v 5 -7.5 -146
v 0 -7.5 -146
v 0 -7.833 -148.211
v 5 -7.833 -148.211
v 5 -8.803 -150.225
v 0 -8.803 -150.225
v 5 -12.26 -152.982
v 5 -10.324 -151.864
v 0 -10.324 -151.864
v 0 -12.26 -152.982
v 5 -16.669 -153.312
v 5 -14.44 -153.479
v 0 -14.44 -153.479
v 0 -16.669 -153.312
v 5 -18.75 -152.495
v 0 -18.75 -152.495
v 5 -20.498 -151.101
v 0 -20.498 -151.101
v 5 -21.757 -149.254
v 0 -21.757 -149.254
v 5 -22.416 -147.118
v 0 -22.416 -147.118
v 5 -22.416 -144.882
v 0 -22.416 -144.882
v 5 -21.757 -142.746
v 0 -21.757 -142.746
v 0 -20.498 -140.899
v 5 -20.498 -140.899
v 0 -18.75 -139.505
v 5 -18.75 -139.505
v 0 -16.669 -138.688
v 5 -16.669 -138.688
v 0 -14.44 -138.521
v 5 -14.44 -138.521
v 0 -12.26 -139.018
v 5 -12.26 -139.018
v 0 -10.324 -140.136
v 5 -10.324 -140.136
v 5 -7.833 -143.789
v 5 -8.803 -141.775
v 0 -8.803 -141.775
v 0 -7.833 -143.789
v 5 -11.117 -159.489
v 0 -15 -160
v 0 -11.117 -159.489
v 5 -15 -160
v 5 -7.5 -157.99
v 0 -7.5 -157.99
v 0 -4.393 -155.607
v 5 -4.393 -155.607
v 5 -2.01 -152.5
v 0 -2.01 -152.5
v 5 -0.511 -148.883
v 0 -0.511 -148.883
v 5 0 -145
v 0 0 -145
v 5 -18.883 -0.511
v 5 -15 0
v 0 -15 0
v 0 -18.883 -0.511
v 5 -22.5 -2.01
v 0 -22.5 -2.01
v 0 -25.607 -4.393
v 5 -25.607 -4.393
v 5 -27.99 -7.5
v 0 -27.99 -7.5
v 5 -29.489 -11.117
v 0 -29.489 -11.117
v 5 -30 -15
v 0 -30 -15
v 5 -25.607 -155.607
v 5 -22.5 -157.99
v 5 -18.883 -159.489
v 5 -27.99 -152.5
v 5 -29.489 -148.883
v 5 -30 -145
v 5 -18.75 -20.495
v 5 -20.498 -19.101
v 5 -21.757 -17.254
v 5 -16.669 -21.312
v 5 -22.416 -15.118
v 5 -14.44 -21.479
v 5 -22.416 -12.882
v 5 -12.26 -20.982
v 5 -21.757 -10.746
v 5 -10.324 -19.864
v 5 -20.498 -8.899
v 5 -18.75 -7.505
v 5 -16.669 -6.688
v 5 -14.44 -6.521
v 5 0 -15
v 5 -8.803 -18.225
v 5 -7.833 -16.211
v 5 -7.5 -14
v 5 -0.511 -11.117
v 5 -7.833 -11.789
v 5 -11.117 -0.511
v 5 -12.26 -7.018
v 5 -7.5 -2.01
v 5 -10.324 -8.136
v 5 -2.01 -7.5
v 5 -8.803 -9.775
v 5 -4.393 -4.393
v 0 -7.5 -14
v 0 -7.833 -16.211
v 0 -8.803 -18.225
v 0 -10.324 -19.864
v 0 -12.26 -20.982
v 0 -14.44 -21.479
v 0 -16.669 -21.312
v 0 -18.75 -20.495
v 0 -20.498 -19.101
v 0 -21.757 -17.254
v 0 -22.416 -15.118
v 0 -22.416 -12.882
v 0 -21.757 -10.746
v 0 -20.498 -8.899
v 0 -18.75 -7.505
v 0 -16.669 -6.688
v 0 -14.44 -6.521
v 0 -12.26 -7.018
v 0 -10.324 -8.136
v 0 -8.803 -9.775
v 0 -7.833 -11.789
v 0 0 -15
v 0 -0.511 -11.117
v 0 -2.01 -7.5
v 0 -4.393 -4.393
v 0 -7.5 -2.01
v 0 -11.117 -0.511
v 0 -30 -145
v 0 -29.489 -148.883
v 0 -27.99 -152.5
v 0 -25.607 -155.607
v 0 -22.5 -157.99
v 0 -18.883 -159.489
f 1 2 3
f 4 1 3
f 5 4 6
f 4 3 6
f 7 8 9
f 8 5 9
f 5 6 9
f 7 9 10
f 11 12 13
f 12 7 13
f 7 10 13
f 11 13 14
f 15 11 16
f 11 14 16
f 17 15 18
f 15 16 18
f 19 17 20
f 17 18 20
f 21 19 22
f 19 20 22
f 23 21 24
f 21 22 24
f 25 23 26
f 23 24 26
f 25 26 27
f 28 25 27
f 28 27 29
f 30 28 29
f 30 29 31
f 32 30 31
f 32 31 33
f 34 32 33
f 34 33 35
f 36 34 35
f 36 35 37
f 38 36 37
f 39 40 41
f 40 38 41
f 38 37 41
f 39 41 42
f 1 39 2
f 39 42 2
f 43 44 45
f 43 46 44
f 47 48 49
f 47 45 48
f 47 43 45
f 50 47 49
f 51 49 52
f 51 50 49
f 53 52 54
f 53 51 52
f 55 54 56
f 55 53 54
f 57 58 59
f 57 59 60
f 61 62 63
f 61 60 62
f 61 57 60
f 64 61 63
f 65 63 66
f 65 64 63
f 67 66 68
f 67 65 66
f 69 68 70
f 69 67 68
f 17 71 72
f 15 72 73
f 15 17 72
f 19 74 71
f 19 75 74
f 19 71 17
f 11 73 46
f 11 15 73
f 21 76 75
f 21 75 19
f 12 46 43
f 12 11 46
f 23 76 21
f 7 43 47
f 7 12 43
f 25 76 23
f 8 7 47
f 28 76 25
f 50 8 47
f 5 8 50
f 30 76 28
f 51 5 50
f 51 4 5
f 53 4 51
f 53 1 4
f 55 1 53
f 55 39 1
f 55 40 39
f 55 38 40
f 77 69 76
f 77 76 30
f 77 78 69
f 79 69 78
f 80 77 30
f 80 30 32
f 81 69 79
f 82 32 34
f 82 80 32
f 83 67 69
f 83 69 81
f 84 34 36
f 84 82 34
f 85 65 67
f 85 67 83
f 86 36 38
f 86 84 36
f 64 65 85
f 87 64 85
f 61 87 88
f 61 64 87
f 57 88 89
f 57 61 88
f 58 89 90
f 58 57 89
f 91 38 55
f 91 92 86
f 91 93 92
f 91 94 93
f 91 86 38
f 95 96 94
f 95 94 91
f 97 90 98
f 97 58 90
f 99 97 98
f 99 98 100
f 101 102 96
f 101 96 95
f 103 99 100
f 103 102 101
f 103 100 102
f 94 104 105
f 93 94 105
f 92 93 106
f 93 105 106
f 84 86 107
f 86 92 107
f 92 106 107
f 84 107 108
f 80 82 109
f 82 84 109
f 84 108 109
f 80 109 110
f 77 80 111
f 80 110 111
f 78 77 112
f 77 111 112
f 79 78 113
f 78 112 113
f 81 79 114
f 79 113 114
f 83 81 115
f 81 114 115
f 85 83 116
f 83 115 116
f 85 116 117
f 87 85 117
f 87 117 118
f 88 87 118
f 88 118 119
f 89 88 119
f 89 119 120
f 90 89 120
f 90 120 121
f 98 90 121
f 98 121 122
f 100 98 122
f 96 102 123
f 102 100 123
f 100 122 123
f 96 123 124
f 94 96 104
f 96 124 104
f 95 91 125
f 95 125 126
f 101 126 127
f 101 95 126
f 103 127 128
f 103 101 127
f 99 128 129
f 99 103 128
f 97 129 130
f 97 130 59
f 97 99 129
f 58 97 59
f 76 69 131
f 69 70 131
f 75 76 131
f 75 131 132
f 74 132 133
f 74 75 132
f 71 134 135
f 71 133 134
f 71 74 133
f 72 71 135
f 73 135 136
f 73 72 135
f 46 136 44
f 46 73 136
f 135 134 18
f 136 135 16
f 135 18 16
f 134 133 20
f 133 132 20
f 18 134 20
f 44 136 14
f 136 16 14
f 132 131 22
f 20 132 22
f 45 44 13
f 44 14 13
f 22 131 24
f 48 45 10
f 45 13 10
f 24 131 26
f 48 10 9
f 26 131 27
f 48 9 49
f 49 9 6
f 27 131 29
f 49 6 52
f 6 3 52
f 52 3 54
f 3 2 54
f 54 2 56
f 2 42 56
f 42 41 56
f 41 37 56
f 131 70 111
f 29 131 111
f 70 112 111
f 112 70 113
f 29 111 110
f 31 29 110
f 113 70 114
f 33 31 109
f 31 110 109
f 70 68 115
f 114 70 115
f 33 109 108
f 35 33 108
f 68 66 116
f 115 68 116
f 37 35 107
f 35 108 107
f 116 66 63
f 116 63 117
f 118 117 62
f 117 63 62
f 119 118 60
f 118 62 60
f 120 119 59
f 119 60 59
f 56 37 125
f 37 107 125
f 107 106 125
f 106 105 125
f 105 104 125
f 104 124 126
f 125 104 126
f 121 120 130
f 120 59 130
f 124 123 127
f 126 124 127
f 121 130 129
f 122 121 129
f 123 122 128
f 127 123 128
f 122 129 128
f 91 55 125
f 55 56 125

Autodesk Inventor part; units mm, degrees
ref_plane "YZ Plane" through (0, 0, 0) normal (1, 0, 0) x (0, 1, 0)
ref_plane "XZ Plane" through (0, 0, 0) normal (0, 1, 0) x (-1, 0, 0)
ref_plane "XY Plane" through (0, 0, 0) normal (0, 0, 1) x (1, 0, 0)
sketch "Sketch1" plane through (0, 0, 0) normal (1, 0, 0) x (0, 1, 0)
  line L0 (0, 0) -> (-30, 0)
  line L1 (-30, 0) -> (-30, -160)
  line L2 (-30, -160) -> (0, -160)
  line L3 (0, -160) -> (0, 0)
  circle A0 centre (-15, -14) radius 7.5
  circle A1 centre (-15, -146) radius 7.5
  dimension "d0" = 30
  dimension "d1" = 160
  dimension "d3" = 15
  dimension "d5" = 15
extrude "Extrusion1" add sketch "Sketch1" along normal blind 5
sketch "Sketch2" plane through (5, 0, 0) normal (1, 0, 0) x (0, 0, -1)
  circle A0 centre (14, -15) radius 7.5 projected
  arc A1 (14, 0) -> (14, -30) centre (14, -15) ccw
  line L0 (0, -30) -> (160, -30) projected
  circle A2 centre (146, -15) radius 7.5 projected
  arc A3 (146, -30) -> (146, 0) centre (146, -15) ccw
  line L1 (146, -30) -> (161, -30)
  line L2 (161, -30) -> (161, 0)
  line L3 (161, 0) -> (146, 0)
  line L4 (14, 0) -> (-1, 0)
  line L5 (-1, 0) -> (-1, -30)
  line L6 (-1, -30) -> (14, -30)
  point P0 (0, 0)
  point P1 (-1, -15)
  point P2 (161, -15)
extrude "Extrusion2" cut sketch "Sketch2" along normal blind 10 contours A3 L3 L2 | A3 L2 L1 L0 | A1 L0 L6 L5 | A1 L5 L4
fillet "Fillet1" radius 15 4 edges at (2.5, 0, 0) (2.5, -30, 0) (2.5, 0, -160) (2.5, -30, -160)
sketch "Sketch3" plane through (5, 0, 0) normal (1, 0, 0) x (0, 0, -1)
  point P0 (0, 0)
equation "\"BendRadius\" = Thickness"
equation "\"BendReliefWidth\" = Thickness"
equation "\"BendReliefDepth\" = 0.5 * Thickness"
equation "\"CornerReliefSize\" = 4 * Thickness"
equation "\"MinimumRemnant\" = 2 * Thickness"
equation "\"TransitionRadius\" = BendRadius"
equation "\"JacobiRadiusSize\" = BendRadius"
equation "\"GapSize\" = Thickness"
equation "\"Thickness\" = 0.5"
properties part number "Acoplador"
